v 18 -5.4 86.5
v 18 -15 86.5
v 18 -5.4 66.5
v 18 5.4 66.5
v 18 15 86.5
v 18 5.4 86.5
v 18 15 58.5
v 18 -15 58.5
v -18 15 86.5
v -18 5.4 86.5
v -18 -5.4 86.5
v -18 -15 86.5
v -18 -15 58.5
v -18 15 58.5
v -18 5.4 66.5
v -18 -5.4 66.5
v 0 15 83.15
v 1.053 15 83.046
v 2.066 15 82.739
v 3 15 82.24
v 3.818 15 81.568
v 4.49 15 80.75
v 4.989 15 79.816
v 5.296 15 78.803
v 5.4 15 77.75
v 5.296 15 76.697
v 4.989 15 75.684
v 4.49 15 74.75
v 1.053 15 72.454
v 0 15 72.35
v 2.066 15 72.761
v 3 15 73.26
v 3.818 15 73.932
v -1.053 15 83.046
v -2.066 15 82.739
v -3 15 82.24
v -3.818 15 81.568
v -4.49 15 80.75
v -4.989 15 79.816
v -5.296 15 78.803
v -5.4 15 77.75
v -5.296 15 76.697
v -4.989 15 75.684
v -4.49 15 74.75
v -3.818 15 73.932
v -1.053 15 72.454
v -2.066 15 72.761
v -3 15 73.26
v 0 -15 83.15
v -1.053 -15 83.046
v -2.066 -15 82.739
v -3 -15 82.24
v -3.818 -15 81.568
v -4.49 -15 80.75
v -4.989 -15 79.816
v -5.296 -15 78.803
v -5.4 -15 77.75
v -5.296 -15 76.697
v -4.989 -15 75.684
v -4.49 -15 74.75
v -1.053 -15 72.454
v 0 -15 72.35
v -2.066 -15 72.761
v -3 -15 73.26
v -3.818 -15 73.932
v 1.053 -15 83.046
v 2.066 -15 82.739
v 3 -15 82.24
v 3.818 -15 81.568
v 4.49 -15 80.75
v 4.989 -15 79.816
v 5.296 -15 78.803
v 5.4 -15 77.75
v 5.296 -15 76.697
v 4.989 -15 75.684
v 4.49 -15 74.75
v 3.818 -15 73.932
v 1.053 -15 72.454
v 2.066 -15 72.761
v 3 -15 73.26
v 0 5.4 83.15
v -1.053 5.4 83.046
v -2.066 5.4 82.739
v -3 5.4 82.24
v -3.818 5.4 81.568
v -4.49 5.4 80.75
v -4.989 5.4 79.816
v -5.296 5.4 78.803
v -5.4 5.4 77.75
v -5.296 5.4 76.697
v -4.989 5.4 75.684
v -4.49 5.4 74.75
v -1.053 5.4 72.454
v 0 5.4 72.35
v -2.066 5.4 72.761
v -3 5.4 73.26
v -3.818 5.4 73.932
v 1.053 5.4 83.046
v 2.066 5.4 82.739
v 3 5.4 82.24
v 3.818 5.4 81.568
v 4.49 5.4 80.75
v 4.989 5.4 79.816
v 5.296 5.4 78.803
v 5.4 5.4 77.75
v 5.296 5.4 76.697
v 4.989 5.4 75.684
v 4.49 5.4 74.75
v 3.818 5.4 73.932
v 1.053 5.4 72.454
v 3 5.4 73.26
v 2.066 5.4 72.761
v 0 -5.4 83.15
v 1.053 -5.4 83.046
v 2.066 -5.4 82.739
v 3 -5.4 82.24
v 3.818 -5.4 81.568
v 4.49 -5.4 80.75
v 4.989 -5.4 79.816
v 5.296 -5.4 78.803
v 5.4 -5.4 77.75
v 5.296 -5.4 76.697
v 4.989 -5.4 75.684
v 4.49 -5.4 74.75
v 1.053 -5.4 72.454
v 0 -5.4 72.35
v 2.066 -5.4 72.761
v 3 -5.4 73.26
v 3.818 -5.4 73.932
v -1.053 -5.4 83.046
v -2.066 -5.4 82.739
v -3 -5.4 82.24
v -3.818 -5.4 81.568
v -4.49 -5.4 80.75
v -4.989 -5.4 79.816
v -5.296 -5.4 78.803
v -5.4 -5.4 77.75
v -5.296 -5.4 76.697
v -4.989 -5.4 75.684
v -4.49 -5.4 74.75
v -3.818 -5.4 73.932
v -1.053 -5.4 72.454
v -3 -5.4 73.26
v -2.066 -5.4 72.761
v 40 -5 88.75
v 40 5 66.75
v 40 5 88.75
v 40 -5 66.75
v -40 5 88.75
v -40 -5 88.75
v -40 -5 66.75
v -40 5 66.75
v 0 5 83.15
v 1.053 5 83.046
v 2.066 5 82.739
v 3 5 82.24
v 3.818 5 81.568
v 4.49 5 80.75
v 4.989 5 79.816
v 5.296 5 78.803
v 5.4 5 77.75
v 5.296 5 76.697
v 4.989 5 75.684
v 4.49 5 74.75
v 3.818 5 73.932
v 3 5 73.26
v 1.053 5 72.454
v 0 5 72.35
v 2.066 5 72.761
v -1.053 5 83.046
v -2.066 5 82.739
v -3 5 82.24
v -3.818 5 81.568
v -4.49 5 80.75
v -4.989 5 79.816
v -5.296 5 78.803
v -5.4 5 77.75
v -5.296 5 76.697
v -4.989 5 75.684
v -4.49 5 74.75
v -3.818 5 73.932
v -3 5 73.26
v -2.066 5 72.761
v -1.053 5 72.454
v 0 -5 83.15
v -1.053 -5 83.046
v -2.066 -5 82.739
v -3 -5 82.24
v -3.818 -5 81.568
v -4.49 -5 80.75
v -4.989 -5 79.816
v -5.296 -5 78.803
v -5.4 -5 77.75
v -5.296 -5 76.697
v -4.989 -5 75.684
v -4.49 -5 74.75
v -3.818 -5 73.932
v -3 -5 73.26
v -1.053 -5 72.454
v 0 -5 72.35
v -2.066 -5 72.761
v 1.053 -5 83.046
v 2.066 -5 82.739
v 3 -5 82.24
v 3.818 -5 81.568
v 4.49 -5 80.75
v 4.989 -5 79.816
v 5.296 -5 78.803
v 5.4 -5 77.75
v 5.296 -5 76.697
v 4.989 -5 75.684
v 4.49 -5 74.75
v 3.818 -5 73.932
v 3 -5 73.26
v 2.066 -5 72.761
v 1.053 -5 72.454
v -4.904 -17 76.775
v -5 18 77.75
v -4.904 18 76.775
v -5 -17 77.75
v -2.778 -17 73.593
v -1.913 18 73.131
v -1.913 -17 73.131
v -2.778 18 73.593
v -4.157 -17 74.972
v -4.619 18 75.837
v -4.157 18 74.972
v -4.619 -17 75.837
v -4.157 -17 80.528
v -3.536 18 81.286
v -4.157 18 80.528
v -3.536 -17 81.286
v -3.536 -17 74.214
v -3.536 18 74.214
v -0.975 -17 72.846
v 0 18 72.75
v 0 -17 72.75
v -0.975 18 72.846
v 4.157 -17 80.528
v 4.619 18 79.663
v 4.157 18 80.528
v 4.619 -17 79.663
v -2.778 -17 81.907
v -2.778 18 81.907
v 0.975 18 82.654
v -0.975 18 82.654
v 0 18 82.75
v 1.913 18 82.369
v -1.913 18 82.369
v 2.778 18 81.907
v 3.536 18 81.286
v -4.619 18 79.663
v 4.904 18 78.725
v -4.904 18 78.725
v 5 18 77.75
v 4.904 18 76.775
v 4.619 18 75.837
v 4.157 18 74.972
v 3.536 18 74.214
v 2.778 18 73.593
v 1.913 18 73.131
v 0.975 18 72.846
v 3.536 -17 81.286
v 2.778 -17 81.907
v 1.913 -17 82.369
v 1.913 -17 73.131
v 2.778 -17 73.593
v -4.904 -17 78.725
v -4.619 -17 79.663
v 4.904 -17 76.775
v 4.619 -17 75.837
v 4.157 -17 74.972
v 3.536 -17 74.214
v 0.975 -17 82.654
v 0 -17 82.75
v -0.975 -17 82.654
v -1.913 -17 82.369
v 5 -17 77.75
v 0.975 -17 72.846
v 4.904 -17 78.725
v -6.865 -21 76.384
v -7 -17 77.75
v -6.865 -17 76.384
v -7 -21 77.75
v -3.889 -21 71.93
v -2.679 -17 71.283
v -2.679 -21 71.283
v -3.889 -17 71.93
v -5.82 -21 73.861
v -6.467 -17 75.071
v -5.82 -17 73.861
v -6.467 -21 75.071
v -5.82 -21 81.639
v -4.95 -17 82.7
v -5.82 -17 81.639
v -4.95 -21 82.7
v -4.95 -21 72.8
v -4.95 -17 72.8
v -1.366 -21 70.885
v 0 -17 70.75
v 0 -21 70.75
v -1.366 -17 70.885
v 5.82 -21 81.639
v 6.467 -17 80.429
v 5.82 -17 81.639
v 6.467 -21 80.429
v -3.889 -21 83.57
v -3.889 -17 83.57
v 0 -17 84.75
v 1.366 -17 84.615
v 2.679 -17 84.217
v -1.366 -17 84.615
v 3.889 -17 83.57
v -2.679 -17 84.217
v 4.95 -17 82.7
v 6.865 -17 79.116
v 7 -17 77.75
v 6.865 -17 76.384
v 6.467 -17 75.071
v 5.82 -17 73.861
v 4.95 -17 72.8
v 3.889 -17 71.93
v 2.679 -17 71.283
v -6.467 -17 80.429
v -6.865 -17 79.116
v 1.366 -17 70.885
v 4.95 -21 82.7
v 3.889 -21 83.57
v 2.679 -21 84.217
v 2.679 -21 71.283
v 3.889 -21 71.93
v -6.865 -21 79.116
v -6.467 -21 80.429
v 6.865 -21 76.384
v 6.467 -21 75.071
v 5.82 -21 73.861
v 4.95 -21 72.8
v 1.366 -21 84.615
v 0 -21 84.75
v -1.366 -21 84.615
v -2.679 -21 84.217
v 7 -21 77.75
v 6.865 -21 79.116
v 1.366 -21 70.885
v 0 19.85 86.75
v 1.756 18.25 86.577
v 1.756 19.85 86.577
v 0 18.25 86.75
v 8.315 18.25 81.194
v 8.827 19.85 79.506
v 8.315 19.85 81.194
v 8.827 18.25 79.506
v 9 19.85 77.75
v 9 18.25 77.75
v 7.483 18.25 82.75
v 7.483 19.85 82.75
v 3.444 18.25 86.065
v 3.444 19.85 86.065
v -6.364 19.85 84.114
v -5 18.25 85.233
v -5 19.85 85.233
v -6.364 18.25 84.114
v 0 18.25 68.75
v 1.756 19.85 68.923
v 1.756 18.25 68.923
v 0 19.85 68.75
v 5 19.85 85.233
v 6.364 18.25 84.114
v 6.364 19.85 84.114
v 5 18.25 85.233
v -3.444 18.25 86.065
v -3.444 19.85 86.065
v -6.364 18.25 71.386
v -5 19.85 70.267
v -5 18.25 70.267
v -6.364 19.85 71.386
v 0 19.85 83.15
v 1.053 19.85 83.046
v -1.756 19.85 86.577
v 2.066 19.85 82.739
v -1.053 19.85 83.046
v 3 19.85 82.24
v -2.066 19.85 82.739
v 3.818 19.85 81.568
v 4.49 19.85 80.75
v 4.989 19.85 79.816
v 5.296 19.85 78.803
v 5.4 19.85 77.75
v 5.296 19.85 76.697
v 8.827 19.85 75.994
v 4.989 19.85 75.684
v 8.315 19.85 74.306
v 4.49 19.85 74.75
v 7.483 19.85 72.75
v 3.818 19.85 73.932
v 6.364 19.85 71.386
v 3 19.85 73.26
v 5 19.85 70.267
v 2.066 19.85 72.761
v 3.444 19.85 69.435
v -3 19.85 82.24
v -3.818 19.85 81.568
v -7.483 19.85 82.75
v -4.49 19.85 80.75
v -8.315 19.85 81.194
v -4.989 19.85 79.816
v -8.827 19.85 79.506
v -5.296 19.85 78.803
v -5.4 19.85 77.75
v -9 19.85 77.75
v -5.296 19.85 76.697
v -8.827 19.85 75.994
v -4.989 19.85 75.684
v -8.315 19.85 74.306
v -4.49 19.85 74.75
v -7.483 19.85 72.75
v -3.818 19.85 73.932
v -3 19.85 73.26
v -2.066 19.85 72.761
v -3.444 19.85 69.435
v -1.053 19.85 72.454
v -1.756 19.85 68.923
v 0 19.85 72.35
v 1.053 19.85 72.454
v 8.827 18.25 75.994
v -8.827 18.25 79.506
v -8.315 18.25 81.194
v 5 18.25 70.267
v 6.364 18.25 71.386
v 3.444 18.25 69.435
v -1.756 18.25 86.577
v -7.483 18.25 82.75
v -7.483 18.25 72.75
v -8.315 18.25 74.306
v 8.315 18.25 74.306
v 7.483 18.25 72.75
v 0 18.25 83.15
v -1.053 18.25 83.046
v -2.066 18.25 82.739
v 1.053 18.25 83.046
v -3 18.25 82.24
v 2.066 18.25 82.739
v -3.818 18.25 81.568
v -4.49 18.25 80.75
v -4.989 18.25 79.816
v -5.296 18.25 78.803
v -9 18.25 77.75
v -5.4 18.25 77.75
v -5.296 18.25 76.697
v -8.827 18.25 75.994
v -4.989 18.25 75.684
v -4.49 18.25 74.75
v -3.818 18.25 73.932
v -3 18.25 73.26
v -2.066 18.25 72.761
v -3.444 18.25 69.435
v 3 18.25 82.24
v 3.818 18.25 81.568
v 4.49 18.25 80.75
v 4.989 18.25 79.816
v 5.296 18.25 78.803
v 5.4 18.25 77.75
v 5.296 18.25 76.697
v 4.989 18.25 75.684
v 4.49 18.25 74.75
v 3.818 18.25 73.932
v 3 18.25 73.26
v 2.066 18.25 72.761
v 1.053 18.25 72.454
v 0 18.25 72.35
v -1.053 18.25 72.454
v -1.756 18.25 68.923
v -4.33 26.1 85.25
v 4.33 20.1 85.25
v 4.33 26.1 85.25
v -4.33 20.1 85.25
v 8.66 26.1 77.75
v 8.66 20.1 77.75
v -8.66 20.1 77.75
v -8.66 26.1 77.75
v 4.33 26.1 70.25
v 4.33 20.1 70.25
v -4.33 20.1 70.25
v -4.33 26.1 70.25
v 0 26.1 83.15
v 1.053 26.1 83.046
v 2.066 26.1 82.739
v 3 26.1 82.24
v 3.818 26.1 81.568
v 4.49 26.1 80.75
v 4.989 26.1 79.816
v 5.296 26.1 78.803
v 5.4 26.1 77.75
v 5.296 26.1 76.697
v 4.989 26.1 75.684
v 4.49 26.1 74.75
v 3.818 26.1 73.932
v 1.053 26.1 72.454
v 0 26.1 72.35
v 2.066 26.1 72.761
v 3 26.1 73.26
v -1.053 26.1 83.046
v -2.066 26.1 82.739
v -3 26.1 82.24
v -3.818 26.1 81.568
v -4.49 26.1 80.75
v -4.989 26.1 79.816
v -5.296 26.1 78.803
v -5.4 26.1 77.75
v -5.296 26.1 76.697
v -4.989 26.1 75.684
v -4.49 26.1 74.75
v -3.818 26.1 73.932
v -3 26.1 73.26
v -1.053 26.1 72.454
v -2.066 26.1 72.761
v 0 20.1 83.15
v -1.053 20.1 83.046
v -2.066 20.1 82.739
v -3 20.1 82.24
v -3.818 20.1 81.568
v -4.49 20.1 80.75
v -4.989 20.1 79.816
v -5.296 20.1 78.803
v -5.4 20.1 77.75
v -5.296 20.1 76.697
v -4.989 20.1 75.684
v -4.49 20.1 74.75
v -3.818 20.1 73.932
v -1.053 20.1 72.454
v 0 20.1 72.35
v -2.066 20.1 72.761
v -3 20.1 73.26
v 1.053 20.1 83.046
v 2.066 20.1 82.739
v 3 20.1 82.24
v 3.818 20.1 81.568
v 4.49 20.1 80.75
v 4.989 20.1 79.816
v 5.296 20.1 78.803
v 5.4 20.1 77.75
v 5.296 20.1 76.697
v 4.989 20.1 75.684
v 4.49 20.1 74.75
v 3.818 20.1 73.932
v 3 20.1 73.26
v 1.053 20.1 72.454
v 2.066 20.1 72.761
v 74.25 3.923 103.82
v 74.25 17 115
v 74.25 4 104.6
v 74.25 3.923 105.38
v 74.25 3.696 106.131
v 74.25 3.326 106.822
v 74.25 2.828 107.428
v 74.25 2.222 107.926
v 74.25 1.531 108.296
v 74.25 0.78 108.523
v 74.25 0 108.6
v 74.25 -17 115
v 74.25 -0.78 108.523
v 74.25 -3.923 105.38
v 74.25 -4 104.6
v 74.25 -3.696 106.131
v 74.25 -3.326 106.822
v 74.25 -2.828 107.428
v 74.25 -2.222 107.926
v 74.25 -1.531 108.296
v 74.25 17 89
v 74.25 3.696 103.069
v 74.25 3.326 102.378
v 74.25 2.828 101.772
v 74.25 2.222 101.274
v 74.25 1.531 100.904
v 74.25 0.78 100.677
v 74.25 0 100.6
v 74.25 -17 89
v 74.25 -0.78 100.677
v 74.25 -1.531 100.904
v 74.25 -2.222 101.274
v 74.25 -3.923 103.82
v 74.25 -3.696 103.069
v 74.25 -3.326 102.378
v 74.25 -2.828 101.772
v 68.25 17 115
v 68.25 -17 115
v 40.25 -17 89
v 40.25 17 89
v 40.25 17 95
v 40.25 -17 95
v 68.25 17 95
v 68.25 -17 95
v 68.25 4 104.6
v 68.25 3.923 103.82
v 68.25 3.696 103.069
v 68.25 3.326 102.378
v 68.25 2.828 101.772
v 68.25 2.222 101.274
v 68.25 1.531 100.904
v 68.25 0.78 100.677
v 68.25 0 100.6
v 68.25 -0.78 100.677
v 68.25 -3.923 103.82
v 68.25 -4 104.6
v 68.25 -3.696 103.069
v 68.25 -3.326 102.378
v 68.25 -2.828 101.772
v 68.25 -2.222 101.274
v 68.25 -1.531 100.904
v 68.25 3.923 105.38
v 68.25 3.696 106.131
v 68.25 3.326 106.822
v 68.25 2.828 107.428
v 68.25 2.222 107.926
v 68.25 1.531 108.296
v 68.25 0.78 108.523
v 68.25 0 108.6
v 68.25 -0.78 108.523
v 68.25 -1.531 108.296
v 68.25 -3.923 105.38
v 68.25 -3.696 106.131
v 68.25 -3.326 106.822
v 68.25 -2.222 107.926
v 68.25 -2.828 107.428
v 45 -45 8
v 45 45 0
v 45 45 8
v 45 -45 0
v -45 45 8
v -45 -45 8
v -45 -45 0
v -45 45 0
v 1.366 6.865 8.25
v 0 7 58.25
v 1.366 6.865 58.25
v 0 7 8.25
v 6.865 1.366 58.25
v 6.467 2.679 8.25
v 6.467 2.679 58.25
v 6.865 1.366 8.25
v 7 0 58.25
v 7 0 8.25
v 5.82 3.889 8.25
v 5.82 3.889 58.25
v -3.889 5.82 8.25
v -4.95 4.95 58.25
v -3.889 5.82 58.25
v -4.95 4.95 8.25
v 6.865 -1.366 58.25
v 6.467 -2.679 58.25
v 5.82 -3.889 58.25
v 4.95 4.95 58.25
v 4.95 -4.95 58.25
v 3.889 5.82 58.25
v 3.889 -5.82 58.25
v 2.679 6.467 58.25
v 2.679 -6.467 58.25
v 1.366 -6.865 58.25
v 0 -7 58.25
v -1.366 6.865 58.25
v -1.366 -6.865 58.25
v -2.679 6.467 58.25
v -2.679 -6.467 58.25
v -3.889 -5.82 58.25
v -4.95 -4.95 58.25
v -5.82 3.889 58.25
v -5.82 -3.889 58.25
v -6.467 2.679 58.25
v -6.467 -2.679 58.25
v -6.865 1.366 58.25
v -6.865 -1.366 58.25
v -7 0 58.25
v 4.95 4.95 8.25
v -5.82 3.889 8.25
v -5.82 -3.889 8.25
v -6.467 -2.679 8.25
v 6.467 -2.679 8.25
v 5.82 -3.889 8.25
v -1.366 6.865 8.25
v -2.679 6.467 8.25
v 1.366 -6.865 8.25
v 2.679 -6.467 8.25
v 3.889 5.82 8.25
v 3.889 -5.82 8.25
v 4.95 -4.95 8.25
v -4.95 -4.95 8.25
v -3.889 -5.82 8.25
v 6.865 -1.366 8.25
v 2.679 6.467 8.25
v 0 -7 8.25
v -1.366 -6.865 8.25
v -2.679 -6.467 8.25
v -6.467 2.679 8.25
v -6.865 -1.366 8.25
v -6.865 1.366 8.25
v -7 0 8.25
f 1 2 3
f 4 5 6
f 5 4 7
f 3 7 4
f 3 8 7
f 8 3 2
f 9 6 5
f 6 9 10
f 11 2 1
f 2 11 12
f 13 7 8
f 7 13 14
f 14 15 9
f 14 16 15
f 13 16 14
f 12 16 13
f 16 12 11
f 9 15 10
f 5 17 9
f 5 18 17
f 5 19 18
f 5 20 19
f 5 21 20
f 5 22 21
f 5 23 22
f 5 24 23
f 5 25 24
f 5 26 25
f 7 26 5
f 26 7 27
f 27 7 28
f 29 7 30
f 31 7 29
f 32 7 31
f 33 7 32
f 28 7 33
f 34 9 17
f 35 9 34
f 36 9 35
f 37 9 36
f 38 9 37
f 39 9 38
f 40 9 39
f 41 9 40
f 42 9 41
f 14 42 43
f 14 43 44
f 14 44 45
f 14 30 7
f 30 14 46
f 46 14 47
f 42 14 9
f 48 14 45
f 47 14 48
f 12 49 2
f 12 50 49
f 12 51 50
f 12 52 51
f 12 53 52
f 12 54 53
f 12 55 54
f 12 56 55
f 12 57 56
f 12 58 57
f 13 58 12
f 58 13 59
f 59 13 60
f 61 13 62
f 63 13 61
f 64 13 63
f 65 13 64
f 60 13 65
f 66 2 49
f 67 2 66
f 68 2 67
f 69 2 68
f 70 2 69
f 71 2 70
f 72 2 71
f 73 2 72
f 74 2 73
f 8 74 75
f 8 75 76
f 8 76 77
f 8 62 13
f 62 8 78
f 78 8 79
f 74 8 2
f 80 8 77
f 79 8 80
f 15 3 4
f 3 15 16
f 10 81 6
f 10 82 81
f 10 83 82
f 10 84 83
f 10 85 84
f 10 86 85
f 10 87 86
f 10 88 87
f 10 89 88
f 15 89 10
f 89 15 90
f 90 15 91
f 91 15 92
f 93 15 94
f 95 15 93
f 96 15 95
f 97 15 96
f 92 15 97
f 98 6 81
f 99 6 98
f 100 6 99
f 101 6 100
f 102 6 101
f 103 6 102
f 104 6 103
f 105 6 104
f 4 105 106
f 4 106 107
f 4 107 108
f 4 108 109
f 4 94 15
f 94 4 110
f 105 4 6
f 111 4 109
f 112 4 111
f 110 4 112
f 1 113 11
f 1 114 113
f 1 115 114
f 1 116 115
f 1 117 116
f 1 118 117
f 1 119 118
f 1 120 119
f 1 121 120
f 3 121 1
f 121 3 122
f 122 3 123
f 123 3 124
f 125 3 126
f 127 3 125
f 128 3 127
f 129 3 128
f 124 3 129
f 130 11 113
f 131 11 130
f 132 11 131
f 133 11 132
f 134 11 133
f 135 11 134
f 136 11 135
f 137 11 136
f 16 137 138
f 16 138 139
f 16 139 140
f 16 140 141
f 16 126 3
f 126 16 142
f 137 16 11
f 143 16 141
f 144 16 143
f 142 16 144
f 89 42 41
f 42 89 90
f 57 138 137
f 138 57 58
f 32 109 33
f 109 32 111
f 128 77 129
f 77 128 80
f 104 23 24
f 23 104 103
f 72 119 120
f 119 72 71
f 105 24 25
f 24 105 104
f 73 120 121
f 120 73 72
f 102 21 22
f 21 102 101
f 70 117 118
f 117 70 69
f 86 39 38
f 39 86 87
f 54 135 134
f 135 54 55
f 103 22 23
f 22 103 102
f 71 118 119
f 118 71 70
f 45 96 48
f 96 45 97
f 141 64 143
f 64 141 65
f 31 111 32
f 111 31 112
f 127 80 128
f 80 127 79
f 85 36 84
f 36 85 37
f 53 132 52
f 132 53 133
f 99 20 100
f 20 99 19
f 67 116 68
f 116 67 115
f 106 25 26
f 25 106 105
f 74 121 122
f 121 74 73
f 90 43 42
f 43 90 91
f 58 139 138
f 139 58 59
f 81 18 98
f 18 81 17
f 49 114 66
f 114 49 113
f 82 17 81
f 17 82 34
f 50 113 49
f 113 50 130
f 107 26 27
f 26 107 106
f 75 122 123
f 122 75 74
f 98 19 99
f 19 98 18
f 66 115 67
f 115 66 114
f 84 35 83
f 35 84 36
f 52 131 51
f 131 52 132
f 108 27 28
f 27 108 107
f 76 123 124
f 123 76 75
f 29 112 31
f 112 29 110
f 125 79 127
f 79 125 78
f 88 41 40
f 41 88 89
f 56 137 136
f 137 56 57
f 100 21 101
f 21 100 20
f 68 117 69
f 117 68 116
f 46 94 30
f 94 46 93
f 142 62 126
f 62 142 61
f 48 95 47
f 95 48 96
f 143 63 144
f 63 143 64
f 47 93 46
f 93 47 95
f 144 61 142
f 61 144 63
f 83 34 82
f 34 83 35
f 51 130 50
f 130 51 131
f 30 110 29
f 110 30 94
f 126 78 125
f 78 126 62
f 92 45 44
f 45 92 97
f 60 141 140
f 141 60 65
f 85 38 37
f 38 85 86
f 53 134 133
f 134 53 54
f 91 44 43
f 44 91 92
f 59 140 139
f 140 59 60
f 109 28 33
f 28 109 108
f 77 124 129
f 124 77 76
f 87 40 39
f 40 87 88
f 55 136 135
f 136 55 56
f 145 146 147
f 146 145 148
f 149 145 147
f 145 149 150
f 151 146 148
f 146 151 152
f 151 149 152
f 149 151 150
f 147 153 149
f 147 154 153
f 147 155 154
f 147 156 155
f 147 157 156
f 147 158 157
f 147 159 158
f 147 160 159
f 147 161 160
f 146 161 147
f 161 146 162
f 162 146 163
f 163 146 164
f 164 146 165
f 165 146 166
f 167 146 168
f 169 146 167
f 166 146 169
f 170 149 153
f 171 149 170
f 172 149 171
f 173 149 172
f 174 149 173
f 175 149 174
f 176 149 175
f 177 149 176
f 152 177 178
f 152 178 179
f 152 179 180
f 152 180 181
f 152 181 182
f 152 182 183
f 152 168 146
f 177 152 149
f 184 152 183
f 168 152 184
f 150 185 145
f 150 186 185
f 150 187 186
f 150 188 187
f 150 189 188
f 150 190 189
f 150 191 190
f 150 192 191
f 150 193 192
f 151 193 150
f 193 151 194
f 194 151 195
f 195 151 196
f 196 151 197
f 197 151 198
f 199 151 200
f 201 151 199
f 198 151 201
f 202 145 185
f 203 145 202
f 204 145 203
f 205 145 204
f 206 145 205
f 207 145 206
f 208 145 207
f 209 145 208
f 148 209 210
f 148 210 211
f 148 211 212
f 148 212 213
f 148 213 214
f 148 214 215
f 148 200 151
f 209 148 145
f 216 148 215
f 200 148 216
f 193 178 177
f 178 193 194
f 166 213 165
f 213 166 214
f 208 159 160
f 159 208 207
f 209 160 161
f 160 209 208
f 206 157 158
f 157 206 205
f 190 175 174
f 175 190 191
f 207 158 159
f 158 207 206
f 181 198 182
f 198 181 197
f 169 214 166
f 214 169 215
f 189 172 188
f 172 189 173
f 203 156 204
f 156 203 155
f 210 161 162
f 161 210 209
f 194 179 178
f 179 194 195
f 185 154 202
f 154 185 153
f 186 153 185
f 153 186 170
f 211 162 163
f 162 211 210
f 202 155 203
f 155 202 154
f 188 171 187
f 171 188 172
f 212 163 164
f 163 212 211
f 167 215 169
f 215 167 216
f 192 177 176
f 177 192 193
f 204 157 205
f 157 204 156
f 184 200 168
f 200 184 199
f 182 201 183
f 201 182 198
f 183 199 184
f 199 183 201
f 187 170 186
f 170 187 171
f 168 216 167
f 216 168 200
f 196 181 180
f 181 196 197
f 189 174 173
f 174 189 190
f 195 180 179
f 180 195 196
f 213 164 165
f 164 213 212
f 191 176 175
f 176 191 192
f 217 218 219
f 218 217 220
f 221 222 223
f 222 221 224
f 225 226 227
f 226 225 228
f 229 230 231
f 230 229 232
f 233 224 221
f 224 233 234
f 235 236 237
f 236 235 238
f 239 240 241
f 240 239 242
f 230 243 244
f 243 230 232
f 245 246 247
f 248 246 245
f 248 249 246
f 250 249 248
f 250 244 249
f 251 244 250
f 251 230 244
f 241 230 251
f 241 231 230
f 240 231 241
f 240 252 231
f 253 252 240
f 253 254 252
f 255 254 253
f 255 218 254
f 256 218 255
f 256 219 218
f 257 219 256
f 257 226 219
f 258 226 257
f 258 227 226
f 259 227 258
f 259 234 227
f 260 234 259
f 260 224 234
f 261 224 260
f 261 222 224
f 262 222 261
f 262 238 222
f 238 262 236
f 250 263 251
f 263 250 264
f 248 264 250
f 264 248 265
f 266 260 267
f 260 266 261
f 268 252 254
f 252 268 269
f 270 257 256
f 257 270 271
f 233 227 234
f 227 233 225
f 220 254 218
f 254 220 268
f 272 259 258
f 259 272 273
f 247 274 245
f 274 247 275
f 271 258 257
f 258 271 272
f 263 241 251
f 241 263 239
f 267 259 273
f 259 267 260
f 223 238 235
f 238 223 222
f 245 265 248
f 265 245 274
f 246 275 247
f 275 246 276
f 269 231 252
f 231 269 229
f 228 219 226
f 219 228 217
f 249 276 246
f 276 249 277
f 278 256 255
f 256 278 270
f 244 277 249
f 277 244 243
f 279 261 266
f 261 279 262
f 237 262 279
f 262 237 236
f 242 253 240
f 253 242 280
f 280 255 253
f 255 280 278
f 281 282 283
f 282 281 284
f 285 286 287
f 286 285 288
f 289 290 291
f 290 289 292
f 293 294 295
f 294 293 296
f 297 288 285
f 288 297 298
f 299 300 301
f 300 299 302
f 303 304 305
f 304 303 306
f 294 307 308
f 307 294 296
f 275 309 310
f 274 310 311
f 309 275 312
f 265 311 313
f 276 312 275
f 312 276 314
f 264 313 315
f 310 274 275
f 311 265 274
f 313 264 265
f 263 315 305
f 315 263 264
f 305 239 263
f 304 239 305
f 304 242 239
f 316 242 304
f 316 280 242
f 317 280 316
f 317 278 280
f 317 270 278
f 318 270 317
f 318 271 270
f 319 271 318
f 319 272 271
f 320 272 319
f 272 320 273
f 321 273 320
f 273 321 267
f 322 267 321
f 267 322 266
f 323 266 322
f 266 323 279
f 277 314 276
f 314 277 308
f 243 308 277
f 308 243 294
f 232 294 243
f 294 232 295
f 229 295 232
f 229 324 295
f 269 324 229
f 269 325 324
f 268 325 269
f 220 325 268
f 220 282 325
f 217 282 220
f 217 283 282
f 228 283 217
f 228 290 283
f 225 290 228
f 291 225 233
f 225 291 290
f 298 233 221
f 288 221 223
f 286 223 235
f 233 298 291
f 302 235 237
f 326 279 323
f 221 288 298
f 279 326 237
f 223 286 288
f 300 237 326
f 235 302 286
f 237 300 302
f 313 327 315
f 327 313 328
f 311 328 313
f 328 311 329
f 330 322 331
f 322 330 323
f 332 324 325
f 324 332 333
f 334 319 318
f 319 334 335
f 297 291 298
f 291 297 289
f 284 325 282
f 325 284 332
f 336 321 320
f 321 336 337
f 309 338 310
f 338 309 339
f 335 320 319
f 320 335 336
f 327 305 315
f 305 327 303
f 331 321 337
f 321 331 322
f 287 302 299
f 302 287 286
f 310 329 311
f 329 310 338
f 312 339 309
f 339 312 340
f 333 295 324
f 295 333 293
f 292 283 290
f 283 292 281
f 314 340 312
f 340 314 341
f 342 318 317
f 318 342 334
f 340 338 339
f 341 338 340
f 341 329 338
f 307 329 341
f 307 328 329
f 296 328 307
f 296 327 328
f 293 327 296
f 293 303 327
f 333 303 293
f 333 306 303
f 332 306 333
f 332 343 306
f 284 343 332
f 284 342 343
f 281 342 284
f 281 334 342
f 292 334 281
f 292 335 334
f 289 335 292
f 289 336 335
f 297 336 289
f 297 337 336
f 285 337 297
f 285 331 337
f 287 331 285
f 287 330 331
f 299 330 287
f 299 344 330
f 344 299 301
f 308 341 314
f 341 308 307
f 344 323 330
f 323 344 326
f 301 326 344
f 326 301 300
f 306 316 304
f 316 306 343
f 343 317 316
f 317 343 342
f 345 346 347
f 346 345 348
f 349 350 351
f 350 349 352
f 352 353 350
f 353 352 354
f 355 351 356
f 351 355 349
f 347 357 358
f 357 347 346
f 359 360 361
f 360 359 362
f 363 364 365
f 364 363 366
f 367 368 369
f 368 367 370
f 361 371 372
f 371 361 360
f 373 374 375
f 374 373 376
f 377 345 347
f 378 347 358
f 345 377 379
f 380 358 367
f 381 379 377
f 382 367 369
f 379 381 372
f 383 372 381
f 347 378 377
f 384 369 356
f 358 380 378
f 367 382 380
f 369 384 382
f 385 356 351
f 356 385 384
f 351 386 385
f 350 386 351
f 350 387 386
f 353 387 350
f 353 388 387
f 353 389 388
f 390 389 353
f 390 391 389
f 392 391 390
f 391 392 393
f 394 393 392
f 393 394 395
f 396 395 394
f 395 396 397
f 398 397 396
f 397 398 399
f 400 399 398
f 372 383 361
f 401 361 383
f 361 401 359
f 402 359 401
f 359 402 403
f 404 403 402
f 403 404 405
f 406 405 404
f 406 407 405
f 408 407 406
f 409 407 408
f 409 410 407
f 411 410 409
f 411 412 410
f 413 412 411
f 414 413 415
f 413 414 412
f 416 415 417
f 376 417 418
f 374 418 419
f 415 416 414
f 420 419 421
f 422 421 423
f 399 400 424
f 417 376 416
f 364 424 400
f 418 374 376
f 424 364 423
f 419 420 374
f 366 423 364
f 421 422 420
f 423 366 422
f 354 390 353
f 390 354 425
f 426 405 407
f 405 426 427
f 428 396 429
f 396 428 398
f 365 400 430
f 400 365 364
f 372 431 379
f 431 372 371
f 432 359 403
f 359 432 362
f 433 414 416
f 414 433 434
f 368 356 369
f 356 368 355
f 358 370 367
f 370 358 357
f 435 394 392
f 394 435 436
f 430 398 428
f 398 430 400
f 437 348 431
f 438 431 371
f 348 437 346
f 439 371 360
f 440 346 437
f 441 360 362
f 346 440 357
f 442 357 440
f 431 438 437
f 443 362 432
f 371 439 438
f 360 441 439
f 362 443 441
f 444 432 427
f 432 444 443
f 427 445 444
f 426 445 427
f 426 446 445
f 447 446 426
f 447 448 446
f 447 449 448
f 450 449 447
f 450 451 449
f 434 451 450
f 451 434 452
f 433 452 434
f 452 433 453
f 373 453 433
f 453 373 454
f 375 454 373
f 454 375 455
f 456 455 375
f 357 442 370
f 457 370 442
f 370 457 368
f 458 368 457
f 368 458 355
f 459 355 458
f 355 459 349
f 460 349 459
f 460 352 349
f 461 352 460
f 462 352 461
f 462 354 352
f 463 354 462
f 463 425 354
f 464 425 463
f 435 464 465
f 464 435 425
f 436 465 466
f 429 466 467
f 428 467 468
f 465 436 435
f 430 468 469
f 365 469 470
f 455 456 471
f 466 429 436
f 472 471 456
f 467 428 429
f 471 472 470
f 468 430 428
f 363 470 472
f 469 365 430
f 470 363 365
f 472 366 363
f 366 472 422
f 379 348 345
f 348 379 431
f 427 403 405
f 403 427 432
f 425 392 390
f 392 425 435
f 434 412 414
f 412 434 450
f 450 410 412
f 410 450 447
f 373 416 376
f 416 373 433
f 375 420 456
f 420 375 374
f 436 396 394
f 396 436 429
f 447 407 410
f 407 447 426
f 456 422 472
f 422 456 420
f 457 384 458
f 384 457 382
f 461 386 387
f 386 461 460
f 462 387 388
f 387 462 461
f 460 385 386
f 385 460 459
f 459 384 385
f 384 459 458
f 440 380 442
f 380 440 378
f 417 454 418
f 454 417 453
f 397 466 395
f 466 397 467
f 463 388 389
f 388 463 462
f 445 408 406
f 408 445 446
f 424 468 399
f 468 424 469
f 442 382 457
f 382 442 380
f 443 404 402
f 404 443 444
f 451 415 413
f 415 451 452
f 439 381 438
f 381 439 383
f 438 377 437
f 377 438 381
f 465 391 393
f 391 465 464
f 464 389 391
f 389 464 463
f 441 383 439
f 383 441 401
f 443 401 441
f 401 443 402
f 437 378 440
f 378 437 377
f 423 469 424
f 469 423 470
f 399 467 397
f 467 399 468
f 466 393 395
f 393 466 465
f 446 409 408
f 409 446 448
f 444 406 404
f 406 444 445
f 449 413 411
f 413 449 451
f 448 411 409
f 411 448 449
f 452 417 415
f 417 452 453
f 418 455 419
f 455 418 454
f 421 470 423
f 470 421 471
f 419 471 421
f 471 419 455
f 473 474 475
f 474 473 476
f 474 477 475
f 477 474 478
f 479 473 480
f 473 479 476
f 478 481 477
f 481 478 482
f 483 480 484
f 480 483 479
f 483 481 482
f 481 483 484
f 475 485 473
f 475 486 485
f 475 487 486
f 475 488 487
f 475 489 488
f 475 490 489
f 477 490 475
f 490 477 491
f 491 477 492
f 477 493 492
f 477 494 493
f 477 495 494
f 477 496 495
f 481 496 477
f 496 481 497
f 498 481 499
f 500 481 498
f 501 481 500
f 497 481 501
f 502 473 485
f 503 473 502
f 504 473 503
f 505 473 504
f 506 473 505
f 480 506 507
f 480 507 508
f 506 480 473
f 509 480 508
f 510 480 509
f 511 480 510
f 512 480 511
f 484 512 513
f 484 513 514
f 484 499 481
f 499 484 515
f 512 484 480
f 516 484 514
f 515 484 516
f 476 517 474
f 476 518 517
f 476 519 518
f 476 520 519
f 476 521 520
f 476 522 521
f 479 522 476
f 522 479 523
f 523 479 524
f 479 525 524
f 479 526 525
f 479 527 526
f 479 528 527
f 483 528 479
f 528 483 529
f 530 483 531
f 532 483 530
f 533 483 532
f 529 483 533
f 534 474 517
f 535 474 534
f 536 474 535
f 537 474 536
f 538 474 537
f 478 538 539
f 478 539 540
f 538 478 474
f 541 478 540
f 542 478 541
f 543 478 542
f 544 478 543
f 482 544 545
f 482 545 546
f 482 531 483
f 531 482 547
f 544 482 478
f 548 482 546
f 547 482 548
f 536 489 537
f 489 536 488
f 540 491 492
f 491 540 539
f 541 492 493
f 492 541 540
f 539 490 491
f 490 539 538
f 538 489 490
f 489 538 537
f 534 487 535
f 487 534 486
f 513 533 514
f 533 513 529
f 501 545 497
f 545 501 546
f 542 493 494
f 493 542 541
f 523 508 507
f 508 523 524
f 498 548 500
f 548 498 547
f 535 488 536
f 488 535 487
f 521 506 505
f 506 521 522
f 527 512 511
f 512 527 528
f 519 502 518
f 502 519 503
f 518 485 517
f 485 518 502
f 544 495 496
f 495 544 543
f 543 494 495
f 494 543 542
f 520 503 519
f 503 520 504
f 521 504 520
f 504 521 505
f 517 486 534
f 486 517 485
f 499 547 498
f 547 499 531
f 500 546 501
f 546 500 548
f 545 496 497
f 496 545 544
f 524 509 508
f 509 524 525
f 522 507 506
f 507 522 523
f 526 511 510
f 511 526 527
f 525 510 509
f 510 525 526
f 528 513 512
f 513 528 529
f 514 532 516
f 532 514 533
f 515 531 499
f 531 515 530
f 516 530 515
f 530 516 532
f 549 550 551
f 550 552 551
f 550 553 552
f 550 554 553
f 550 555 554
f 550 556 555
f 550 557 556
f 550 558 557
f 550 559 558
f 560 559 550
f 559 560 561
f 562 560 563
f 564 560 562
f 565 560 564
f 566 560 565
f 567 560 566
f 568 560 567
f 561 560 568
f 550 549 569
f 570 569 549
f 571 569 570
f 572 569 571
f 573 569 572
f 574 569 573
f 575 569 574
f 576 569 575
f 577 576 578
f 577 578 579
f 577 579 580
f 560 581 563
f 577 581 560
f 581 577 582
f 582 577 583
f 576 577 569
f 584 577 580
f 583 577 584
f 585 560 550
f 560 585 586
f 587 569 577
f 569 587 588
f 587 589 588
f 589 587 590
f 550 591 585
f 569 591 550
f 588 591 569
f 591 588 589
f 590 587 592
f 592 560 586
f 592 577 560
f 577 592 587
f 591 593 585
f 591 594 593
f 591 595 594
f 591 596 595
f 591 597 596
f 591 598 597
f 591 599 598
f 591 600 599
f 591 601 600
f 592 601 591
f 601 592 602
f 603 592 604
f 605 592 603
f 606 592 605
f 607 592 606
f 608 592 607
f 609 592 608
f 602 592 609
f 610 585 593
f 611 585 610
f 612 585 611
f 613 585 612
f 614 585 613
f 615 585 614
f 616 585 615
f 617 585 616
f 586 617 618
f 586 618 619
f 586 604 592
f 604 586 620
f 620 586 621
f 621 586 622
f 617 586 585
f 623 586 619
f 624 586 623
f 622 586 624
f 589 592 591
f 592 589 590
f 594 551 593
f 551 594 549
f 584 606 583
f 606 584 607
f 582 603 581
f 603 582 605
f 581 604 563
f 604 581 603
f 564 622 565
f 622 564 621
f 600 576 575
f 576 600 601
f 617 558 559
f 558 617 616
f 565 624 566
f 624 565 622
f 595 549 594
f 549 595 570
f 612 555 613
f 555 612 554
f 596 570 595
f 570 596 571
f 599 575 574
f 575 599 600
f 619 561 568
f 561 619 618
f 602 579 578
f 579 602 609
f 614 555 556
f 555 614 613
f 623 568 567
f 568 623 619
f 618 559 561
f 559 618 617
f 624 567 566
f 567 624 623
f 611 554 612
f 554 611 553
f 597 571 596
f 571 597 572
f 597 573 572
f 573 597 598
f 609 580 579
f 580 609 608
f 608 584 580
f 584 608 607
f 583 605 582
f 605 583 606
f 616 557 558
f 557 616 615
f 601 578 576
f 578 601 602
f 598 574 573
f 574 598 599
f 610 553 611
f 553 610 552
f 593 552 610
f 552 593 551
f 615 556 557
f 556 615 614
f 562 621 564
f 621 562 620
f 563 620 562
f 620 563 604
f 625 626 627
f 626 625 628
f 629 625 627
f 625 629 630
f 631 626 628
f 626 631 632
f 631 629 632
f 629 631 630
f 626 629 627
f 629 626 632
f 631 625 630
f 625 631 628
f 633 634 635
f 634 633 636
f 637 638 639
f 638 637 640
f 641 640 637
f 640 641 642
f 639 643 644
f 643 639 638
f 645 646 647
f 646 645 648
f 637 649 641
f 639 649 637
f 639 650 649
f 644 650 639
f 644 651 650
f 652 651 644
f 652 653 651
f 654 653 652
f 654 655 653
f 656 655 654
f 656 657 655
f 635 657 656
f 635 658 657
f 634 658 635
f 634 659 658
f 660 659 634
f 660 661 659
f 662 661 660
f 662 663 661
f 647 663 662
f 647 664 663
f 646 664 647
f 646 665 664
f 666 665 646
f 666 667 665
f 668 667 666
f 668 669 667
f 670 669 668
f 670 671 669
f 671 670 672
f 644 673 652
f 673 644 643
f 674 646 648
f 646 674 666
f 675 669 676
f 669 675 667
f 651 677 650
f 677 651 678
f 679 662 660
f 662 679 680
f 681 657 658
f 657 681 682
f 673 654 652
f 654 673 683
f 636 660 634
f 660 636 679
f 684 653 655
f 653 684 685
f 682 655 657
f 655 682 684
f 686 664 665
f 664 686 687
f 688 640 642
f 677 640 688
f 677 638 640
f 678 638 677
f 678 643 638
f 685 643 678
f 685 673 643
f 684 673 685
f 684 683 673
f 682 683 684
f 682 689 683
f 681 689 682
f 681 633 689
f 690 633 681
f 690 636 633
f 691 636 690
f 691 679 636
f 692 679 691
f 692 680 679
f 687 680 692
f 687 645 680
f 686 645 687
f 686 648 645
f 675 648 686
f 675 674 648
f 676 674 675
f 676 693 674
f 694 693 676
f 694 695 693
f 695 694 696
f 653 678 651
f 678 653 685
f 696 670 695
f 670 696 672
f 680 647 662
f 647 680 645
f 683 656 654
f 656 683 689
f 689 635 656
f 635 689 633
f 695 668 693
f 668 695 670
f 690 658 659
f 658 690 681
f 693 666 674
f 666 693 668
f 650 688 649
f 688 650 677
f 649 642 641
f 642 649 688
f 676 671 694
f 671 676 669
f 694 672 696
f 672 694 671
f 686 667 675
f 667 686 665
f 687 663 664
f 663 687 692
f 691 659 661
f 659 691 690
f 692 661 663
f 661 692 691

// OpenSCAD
$fn = 32;

// ------------------------------------------------------------------------
// Lamp arm: column d14 x 50 mm, arm 80 mm
// Every part is its own module, assembly() places every instance.
// ------------------------------------------------------------------------

// --- part 1 ---
module lamp_base() {
  difference() {
    translate([-45, -45, 0]) cube([90, 90, 8]);
  }
}

// --- part 2 ---
module lamp_column() {
  cylinder(h = 50, d = 14);
}

// --- part 3 ---
module head_fork() {
  difference() {
    translate([-18, -15, 0]) cube([36, 30, 28]);
    translate([-19, -5.4, 8]) cube([38, 10.8, 21]);
    translate([0, 0, 19.25]) rotate([90, 0, 0]) cylinder(h = 32, d = 10.8, center = true);
  }
}

// --- part 4 ---
module lamp_arm() {
  difference() {
    translate([-40, -5, 0]) cube([80, 10, 22]);
    translate([0, 0, 11]) rotate([90, 0, 0]) cylinder(h = 12, d = 10.8, center = true);
  }
}

// --- part 5 ---
module arm_pin() {
  rotate([0, 90, 0]) cylinder(h = 36, d = 10, center = true);
  translate([-21, 0, 0]) rotate([0, 90, 0]) cylinder(h = 4, d = 14);
}

// --- part 6 ---
module arm_washer() {
  difference() {
      translate([0, 0, 0]) cylinder(h = 1.6, d = 18);
      translate([0, 0, -1]) cylinder(h = 3.6, d = 10.8);
    }
}

// --- part 7 ---
module arm_nut() {
  difference() {
    linear_extrude(height = 6) polygon(points = [[8.66, 0], [4.33, 7.5], [-4.33, 7.5], [-8.66, 0], [-4.33, -7.5], [4.33, -7.5]]);
    translate([0, 0, -1]) cylinder(h = 8, d = 10.8);
  }
}

// --- part 8 ---
module shade_bracket() {
  difference() {
    translate([-17, -17, 0]) cube([34, 34, 26]);
    translate([-18, -18, 6]) cube([29, 36, 21]);
    translate([14, 0, 15.6]) rotate([0, 90, 0]) cylinder(h = 8, d = 8, center = true);
  }
}

// --- assembly ---
module assembly() {
  color([0.80, 0.24, 0.20]) translate([0, 0, 0]) rotate([0, 0, 0]) lamp_base();
  color([0.20, 0.45, 0.75]) translate([0, 0, 8.25]) rotate([0, 0, 0]) lamp_column();
  color([0.25, 0.62, 0.32]) translate([0, 0, 58.5]) rotate([0, 0, 0]) head_fork();
  color([0.92, 0.70, 0.18]) translate([0, 0, 66.75]) rotate([0, 0, 0]) lamp_arm();
  color([0.58, 0.35, 0.70]) translate([0, 0, 77.75]) rotate([0, 0, 90]) arm_pin();
  color([0.16, 0.66, 0.66]) translate([0, 19.85, 77.75]) rotate([90, 0, 0]) arm_washer();
  color([0.85, 0.48, 0.18]) translate([0, 26.1, 77.75]) rotate([90, 0, 0]) arm_nut();
  color([0.55, 0.60, 0.65]) translate([57.25, 0, 89]) rotate([0, 0, 0]) shade_bracket();
}

assembly();
